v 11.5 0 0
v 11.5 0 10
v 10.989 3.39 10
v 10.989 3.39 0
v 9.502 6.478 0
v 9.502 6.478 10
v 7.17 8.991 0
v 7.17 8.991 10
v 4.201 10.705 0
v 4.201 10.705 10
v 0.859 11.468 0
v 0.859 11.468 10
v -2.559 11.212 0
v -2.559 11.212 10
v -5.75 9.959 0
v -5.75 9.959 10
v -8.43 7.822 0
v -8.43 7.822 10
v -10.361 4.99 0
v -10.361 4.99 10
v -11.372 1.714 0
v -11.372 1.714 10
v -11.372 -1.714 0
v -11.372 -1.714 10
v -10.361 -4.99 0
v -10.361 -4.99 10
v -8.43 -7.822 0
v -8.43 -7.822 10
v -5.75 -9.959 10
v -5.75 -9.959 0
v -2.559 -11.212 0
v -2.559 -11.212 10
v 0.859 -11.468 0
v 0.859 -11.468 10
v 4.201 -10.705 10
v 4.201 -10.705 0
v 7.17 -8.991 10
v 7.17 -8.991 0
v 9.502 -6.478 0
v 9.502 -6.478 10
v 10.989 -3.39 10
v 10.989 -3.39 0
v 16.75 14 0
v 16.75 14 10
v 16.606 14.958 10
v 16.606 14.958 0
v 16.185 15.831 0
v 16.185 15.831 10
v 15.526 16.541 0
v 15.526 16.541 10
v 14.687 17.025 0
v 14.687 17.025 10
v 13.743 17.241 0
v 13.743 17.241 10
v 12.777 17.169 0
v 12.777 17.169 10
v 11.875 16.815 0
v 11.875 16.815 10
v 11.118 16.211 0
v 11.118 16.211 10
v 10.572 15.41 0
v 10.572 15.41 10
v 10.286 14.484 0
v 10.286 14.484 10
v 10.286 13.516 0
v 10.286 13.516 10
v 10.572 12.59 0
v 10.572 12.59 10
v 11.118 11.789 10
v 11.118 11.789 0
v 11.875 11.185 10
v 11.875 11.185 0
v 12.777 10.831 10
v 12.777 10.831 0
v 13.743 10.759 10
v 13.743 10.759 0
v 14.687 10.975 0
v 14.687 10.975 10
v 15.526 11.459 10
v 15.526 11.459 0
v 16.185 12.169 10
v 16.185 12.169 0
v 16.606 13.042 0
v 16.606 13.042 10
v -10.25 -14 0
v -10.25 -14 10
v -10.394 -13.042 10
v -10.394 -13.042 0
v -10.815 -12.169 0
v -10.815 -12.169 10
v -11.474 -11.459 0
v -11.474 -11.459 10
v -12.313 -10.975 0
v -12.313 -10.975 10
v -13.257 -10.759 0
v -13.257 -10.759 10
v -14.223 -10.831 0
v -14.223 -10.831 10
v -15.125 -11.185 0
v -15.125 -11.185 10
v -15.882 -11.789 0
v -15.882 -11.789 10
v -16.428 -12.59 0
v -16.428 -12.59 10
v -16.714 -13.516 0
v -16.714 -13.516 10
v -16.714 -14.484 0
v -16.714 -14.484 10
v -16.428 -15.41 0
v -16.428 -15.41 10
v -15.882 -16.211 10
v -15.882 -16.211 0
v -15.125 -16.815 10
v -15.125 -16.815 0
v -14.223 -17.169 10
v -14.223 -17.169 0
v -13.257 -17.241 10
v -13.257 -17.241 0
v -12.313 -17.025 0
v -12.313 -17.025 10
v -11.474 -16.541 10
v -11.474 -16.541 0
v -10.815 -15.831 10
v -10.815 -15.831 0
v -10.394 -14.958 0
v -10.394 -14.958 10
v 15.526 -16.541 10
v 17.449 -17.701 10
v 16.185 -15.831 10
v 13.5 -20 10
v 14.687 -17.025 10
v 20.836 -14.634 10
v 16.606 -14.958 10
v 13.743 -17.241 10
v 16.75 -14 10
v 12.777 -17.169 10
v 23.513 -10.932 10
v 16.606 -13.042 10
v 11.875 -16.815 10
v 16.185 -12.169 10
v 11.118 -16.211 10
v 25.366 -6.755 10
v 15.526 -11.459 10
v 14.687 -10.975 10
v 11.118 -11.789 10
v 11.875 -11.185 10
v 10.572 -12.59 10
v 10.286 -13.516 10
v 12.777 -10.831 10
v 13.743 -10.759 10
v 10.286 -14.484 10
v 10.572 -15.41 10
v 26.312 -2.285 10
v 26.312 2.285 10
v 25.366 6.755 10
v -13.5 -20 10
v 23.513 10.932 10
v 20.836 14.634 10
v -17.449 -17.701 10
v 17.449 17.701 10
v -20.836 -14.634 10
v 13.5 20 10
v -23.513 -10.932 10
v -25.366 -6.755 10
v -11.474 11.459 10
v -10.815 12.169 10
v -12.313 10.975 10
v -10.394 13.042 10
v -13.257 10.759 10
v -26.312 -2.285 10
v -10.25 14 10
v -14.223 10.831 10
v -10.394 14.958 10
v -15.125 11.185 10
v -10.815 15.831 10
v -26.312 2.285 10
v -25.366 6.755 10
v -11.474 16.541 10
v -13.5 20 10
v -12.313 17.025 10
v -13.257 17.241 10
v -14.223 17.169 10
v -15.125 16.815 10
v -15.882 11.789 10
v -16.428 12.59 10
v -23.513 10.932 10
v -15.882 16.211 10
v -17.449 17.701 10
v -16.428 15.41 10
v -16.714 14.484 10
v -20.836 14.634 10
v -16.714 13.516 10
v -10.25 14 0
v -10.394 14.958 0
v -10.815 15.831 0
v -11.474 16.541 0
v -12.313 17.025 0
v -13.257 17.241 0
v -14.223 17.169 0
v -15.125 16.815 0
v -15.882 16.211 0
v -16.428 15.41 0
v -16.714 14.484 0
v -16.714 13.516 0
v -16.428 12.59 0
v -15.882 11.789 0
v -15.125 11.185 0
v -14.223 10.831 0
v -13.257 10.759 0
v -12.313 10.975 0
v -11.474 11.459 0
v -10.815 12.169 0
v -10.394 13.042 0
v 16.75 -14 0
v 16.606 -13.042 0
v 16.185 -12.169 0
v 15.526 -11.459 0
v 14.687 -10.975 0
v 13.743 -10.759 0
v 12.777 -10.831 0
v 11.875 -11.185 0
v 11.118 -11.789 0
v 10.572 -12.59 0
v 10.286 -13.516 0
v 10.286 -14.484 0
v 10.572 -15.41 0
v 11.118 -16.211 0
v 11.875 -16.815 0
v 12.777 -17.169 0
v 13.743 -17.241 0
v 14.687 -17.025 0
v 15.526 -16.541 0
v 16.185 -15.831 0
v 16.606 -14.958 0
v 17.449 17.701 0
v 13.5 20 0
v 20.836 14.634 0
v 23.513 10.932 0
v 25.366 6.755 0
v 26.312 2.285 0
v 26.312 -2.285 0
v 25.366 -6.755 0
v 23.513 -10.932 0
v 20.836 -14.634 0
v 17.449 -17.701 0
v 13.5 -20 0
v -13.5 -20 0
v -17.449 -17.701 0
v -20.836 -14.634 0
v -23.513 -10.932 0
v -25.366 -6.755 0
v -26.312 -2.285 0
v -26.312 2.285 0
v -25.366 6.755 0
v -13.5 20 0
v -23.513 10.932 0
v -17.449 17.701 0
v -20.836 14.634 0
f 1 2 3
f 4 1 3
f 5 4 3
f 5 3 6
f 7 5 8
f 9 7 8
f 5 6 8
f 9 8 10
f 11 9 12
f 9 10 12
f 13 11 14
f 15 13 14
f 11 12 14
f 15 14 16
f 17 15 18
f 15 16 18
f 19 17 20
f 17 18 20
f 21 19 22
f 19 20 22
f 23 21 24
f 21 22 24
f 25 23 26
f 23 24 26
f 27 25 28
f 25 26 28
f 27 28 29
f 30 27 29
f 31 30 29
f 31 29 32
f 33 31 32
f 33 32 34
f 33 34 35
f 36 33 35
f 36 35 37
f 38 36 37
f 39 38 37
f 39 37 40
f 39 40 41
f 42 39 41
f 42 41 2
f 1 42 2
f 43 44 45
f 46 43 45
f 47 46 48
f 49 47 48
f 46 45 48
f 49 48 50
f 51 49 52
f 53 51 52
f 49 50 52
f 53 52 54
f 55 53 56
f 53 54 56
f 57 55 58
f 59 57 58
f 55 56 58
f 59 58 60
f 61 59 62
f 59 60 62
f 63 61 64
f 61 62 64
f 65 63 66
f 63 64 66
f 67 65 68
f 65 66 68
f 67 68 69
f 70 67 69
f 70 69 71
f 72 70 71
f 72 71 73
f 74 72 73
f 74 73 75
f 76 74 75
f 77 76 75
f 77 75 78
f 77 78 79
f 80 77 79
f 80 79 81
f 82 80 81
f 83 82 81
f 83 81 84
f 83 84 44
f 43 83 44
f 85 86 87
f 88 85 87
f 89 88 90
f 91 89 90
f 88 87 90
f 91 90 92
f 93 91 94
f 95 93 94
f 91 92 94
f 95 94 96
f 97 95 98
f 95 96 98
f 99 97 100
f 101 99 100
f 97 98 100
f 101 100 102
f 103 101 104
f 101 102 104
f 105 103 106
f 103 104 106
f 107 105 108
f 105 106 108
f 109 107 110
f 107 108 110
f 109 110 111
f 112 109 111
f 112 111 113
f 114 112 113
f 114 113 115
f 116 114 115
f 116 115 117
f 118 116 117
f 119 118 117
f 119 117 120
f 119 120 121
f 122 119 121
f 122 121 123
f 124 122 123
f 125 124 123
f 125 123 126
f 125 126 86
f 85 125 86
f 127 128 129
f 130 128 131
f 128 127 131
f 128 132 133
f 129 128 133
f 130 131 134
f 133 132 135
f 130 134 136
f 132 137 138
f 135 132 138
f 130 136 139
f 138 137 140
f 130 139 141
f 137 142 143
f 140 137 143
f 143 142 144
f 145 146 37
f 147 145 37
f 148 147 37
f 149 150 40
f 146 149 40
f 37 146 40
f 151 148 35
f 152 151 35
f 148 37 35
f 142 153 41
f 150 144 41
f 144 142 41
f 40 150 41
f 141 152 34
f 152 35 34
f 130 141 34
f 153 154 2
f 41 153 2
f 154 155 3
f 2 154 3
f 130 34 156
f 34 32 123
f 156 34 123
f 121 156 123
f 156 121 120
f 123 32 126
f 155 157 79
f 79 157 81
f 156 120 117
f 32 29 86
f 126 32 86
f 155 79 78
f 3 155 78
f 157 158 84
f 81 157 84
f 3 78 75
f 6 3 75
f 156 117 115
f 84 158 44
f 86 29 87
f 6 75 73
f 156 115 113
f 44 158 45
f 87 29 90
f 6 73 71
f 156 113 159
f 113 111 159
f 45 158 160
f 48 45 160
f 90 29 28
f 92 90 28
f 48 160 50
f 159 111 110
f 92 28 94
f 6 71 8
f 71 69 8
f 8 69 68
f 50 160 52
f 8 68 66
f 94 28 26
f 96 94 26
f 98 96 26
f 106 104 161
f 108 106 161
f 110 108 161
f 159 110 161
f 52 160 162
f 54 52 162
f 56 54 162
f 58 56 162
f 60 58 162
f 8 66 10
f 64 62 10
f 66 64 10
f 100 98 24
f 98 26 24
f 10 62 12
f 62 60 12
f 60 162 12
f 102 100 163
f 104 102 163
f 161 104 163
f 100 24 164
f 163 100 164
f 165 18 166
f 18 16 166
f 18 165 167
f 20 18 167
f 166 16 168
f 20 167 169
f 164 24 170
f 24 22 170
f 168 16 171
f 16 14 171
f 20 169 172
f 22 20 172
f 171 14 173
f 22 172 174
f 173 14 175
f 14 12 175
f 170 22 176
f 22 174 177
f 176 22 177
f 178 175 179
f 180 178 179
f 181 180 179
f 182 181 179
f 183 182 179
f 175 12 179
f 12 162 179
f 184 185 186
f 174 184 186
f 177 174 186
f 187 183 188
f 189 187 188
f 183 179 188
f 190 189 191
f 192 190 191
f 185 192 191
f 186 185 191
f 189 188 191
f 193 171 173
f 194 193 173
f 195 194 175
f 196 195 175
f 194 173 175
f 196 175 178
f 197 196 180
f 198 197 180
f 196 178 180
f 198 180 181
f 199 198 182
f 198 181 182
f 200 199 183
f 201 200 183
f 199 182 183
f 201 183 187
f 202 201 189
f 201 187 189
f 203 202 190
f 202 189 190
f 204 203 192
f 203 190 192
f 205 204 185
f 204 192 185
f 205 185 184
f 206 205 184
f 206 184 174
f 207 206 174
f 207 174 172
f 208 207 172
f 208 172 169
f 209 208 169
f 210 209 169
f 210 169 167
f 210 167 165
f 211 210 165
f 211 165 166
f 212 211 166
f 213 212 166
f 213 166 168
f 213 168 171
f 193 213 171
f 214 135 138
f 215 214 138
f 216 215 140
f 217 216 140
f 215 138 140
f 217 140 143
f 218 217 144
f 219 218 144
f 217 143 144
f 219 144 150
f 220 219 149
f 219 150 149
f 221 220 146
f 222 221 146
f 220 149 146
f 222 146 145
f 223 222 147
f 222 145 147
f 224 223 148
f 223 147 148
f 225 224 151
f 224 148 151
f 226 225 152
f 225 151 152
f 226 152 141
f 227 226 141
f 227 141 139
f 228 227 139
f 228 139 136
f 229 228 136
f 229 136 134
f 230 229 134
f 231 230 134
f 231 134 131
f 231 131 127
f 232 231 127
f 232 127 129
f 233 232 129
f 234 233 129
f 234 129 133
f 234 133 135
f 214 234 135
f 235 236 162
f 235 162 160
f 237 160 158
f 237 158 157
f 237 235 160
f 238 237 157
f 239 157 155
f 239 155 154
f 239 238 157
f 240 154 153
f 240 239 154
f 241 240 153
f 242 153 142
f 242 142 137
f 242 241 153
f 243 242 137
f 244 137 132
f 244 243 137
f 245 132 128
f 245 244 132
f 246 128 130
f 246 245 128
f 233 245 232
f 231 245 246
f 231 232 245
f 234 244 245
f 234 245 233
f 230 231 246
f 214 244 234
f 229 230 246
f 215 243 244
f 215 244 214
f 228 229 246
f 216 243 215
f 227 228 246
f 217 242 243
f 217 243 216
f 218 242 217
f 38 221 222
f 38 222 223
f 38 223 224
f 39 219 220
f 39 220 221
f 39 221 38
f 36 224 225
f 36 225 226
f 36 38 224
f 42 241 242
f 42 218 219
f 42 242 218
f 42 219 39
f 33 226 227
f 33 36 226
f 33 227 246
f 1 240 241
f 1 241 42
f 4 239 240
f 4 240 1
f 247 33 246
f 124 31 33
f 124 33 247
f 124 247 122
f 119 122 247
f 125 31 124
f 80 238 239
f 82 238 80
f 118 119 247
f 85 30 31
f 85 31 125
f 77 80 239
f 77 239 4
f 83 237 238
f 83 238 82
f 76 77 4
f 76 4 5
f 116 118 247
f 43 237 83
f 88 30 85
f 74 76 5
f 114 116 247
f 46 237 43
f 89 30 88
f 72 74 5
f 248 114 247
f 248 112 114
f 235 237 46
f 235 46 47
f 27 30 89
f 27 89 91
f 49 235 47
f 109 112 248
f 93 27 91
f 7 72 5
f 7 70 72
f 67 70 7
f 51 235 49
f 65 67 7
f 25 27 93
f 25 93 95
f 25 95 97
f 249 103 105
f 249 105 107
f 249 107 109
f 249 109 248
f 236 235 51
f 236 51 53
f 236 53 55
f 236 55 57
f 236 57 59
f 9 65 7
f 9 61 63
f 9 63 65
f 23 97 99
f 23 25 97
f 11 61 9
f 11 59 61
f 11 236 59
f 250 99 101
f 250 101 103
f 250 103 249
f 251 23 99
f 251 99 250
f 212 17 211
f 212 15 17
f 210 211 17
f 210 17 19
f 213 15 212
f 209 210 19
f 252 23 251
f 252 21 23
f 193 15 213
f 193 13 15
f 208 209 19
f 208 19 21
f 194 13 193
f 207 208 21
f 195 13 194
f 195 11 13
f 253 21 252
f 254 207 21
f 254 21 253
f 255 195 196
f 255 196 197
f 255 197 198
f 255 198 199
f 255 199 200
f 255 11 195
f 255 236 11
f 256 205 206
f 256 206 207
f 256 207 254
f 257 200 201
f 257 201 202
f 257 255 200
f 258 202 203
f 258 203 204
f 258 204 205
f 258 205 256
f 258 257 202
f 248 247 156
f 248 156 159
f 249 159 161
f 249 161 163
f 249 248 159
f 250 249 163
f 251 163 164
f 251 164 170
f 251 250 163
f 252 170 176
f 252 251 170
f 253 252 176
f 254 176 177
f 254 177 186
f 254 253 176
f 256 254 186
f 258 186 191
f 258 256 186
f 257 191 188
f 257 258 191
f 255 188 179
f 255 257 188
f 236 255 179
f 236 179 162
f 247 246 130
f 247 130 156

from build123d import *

# Parameters (mm, degrees)
BOSS_EXTRUDE1_DEPTH = 10
SKETCH3_R           = 11.5
CUT_EXTRUDE1_DEPTH  = 11
SKETCH4_R           = 3.25
CUT_EXTRUDE2_DEPTH  = 11


with BuildPart() as part:
    # Sketch2 → Boss-Extrude1 (new body)
    with BuildSketch(Plane.XY):
        with BuildLine():
            Line((-13.5, 20), (13.5, 20))
            ThreePointArc((13.5, 20), (26.431712199, 0), (13.5, -20))
            Line((13.5, -20), (-13.5, -20))
            ThreePointArc((-13.5, -20), (-26.431712199, 0), (-13.5, 20))
        make_face()
    extrude(amount=BOSS_EXTRUDE1_DEPTH)

    # Sketch3 → Cut-Extrude1 (cut, through all)
    with BuildSketch(Plane.XY.offset(10)):
        Circle(SKETCH3_R)
    extrude(amount=-CUT_EXTRUDE1_DEPTH, mode=Mode.SUBTRACT)

    # Sketch4 → Cut-Extrude2 (cut, through all)
    with BuildSketch(Plane.XY.offset(10)):
        with Locations((-13.5, 14)):
            Circle(SKETCH4_R)
        with Locations((-13.5, -14)):
            Circle(SKETCH4_R)
        with Locations((13.5, -14)):
            Circle(SKETCH4_R)
        with Locations((13.5, 14)):
            Circle(SKETCH4_R)
    extrude(amount=-CUT_EXTRUDE2_DEPTH, mode=Mode.SUBTRACT)


solid = part.part
